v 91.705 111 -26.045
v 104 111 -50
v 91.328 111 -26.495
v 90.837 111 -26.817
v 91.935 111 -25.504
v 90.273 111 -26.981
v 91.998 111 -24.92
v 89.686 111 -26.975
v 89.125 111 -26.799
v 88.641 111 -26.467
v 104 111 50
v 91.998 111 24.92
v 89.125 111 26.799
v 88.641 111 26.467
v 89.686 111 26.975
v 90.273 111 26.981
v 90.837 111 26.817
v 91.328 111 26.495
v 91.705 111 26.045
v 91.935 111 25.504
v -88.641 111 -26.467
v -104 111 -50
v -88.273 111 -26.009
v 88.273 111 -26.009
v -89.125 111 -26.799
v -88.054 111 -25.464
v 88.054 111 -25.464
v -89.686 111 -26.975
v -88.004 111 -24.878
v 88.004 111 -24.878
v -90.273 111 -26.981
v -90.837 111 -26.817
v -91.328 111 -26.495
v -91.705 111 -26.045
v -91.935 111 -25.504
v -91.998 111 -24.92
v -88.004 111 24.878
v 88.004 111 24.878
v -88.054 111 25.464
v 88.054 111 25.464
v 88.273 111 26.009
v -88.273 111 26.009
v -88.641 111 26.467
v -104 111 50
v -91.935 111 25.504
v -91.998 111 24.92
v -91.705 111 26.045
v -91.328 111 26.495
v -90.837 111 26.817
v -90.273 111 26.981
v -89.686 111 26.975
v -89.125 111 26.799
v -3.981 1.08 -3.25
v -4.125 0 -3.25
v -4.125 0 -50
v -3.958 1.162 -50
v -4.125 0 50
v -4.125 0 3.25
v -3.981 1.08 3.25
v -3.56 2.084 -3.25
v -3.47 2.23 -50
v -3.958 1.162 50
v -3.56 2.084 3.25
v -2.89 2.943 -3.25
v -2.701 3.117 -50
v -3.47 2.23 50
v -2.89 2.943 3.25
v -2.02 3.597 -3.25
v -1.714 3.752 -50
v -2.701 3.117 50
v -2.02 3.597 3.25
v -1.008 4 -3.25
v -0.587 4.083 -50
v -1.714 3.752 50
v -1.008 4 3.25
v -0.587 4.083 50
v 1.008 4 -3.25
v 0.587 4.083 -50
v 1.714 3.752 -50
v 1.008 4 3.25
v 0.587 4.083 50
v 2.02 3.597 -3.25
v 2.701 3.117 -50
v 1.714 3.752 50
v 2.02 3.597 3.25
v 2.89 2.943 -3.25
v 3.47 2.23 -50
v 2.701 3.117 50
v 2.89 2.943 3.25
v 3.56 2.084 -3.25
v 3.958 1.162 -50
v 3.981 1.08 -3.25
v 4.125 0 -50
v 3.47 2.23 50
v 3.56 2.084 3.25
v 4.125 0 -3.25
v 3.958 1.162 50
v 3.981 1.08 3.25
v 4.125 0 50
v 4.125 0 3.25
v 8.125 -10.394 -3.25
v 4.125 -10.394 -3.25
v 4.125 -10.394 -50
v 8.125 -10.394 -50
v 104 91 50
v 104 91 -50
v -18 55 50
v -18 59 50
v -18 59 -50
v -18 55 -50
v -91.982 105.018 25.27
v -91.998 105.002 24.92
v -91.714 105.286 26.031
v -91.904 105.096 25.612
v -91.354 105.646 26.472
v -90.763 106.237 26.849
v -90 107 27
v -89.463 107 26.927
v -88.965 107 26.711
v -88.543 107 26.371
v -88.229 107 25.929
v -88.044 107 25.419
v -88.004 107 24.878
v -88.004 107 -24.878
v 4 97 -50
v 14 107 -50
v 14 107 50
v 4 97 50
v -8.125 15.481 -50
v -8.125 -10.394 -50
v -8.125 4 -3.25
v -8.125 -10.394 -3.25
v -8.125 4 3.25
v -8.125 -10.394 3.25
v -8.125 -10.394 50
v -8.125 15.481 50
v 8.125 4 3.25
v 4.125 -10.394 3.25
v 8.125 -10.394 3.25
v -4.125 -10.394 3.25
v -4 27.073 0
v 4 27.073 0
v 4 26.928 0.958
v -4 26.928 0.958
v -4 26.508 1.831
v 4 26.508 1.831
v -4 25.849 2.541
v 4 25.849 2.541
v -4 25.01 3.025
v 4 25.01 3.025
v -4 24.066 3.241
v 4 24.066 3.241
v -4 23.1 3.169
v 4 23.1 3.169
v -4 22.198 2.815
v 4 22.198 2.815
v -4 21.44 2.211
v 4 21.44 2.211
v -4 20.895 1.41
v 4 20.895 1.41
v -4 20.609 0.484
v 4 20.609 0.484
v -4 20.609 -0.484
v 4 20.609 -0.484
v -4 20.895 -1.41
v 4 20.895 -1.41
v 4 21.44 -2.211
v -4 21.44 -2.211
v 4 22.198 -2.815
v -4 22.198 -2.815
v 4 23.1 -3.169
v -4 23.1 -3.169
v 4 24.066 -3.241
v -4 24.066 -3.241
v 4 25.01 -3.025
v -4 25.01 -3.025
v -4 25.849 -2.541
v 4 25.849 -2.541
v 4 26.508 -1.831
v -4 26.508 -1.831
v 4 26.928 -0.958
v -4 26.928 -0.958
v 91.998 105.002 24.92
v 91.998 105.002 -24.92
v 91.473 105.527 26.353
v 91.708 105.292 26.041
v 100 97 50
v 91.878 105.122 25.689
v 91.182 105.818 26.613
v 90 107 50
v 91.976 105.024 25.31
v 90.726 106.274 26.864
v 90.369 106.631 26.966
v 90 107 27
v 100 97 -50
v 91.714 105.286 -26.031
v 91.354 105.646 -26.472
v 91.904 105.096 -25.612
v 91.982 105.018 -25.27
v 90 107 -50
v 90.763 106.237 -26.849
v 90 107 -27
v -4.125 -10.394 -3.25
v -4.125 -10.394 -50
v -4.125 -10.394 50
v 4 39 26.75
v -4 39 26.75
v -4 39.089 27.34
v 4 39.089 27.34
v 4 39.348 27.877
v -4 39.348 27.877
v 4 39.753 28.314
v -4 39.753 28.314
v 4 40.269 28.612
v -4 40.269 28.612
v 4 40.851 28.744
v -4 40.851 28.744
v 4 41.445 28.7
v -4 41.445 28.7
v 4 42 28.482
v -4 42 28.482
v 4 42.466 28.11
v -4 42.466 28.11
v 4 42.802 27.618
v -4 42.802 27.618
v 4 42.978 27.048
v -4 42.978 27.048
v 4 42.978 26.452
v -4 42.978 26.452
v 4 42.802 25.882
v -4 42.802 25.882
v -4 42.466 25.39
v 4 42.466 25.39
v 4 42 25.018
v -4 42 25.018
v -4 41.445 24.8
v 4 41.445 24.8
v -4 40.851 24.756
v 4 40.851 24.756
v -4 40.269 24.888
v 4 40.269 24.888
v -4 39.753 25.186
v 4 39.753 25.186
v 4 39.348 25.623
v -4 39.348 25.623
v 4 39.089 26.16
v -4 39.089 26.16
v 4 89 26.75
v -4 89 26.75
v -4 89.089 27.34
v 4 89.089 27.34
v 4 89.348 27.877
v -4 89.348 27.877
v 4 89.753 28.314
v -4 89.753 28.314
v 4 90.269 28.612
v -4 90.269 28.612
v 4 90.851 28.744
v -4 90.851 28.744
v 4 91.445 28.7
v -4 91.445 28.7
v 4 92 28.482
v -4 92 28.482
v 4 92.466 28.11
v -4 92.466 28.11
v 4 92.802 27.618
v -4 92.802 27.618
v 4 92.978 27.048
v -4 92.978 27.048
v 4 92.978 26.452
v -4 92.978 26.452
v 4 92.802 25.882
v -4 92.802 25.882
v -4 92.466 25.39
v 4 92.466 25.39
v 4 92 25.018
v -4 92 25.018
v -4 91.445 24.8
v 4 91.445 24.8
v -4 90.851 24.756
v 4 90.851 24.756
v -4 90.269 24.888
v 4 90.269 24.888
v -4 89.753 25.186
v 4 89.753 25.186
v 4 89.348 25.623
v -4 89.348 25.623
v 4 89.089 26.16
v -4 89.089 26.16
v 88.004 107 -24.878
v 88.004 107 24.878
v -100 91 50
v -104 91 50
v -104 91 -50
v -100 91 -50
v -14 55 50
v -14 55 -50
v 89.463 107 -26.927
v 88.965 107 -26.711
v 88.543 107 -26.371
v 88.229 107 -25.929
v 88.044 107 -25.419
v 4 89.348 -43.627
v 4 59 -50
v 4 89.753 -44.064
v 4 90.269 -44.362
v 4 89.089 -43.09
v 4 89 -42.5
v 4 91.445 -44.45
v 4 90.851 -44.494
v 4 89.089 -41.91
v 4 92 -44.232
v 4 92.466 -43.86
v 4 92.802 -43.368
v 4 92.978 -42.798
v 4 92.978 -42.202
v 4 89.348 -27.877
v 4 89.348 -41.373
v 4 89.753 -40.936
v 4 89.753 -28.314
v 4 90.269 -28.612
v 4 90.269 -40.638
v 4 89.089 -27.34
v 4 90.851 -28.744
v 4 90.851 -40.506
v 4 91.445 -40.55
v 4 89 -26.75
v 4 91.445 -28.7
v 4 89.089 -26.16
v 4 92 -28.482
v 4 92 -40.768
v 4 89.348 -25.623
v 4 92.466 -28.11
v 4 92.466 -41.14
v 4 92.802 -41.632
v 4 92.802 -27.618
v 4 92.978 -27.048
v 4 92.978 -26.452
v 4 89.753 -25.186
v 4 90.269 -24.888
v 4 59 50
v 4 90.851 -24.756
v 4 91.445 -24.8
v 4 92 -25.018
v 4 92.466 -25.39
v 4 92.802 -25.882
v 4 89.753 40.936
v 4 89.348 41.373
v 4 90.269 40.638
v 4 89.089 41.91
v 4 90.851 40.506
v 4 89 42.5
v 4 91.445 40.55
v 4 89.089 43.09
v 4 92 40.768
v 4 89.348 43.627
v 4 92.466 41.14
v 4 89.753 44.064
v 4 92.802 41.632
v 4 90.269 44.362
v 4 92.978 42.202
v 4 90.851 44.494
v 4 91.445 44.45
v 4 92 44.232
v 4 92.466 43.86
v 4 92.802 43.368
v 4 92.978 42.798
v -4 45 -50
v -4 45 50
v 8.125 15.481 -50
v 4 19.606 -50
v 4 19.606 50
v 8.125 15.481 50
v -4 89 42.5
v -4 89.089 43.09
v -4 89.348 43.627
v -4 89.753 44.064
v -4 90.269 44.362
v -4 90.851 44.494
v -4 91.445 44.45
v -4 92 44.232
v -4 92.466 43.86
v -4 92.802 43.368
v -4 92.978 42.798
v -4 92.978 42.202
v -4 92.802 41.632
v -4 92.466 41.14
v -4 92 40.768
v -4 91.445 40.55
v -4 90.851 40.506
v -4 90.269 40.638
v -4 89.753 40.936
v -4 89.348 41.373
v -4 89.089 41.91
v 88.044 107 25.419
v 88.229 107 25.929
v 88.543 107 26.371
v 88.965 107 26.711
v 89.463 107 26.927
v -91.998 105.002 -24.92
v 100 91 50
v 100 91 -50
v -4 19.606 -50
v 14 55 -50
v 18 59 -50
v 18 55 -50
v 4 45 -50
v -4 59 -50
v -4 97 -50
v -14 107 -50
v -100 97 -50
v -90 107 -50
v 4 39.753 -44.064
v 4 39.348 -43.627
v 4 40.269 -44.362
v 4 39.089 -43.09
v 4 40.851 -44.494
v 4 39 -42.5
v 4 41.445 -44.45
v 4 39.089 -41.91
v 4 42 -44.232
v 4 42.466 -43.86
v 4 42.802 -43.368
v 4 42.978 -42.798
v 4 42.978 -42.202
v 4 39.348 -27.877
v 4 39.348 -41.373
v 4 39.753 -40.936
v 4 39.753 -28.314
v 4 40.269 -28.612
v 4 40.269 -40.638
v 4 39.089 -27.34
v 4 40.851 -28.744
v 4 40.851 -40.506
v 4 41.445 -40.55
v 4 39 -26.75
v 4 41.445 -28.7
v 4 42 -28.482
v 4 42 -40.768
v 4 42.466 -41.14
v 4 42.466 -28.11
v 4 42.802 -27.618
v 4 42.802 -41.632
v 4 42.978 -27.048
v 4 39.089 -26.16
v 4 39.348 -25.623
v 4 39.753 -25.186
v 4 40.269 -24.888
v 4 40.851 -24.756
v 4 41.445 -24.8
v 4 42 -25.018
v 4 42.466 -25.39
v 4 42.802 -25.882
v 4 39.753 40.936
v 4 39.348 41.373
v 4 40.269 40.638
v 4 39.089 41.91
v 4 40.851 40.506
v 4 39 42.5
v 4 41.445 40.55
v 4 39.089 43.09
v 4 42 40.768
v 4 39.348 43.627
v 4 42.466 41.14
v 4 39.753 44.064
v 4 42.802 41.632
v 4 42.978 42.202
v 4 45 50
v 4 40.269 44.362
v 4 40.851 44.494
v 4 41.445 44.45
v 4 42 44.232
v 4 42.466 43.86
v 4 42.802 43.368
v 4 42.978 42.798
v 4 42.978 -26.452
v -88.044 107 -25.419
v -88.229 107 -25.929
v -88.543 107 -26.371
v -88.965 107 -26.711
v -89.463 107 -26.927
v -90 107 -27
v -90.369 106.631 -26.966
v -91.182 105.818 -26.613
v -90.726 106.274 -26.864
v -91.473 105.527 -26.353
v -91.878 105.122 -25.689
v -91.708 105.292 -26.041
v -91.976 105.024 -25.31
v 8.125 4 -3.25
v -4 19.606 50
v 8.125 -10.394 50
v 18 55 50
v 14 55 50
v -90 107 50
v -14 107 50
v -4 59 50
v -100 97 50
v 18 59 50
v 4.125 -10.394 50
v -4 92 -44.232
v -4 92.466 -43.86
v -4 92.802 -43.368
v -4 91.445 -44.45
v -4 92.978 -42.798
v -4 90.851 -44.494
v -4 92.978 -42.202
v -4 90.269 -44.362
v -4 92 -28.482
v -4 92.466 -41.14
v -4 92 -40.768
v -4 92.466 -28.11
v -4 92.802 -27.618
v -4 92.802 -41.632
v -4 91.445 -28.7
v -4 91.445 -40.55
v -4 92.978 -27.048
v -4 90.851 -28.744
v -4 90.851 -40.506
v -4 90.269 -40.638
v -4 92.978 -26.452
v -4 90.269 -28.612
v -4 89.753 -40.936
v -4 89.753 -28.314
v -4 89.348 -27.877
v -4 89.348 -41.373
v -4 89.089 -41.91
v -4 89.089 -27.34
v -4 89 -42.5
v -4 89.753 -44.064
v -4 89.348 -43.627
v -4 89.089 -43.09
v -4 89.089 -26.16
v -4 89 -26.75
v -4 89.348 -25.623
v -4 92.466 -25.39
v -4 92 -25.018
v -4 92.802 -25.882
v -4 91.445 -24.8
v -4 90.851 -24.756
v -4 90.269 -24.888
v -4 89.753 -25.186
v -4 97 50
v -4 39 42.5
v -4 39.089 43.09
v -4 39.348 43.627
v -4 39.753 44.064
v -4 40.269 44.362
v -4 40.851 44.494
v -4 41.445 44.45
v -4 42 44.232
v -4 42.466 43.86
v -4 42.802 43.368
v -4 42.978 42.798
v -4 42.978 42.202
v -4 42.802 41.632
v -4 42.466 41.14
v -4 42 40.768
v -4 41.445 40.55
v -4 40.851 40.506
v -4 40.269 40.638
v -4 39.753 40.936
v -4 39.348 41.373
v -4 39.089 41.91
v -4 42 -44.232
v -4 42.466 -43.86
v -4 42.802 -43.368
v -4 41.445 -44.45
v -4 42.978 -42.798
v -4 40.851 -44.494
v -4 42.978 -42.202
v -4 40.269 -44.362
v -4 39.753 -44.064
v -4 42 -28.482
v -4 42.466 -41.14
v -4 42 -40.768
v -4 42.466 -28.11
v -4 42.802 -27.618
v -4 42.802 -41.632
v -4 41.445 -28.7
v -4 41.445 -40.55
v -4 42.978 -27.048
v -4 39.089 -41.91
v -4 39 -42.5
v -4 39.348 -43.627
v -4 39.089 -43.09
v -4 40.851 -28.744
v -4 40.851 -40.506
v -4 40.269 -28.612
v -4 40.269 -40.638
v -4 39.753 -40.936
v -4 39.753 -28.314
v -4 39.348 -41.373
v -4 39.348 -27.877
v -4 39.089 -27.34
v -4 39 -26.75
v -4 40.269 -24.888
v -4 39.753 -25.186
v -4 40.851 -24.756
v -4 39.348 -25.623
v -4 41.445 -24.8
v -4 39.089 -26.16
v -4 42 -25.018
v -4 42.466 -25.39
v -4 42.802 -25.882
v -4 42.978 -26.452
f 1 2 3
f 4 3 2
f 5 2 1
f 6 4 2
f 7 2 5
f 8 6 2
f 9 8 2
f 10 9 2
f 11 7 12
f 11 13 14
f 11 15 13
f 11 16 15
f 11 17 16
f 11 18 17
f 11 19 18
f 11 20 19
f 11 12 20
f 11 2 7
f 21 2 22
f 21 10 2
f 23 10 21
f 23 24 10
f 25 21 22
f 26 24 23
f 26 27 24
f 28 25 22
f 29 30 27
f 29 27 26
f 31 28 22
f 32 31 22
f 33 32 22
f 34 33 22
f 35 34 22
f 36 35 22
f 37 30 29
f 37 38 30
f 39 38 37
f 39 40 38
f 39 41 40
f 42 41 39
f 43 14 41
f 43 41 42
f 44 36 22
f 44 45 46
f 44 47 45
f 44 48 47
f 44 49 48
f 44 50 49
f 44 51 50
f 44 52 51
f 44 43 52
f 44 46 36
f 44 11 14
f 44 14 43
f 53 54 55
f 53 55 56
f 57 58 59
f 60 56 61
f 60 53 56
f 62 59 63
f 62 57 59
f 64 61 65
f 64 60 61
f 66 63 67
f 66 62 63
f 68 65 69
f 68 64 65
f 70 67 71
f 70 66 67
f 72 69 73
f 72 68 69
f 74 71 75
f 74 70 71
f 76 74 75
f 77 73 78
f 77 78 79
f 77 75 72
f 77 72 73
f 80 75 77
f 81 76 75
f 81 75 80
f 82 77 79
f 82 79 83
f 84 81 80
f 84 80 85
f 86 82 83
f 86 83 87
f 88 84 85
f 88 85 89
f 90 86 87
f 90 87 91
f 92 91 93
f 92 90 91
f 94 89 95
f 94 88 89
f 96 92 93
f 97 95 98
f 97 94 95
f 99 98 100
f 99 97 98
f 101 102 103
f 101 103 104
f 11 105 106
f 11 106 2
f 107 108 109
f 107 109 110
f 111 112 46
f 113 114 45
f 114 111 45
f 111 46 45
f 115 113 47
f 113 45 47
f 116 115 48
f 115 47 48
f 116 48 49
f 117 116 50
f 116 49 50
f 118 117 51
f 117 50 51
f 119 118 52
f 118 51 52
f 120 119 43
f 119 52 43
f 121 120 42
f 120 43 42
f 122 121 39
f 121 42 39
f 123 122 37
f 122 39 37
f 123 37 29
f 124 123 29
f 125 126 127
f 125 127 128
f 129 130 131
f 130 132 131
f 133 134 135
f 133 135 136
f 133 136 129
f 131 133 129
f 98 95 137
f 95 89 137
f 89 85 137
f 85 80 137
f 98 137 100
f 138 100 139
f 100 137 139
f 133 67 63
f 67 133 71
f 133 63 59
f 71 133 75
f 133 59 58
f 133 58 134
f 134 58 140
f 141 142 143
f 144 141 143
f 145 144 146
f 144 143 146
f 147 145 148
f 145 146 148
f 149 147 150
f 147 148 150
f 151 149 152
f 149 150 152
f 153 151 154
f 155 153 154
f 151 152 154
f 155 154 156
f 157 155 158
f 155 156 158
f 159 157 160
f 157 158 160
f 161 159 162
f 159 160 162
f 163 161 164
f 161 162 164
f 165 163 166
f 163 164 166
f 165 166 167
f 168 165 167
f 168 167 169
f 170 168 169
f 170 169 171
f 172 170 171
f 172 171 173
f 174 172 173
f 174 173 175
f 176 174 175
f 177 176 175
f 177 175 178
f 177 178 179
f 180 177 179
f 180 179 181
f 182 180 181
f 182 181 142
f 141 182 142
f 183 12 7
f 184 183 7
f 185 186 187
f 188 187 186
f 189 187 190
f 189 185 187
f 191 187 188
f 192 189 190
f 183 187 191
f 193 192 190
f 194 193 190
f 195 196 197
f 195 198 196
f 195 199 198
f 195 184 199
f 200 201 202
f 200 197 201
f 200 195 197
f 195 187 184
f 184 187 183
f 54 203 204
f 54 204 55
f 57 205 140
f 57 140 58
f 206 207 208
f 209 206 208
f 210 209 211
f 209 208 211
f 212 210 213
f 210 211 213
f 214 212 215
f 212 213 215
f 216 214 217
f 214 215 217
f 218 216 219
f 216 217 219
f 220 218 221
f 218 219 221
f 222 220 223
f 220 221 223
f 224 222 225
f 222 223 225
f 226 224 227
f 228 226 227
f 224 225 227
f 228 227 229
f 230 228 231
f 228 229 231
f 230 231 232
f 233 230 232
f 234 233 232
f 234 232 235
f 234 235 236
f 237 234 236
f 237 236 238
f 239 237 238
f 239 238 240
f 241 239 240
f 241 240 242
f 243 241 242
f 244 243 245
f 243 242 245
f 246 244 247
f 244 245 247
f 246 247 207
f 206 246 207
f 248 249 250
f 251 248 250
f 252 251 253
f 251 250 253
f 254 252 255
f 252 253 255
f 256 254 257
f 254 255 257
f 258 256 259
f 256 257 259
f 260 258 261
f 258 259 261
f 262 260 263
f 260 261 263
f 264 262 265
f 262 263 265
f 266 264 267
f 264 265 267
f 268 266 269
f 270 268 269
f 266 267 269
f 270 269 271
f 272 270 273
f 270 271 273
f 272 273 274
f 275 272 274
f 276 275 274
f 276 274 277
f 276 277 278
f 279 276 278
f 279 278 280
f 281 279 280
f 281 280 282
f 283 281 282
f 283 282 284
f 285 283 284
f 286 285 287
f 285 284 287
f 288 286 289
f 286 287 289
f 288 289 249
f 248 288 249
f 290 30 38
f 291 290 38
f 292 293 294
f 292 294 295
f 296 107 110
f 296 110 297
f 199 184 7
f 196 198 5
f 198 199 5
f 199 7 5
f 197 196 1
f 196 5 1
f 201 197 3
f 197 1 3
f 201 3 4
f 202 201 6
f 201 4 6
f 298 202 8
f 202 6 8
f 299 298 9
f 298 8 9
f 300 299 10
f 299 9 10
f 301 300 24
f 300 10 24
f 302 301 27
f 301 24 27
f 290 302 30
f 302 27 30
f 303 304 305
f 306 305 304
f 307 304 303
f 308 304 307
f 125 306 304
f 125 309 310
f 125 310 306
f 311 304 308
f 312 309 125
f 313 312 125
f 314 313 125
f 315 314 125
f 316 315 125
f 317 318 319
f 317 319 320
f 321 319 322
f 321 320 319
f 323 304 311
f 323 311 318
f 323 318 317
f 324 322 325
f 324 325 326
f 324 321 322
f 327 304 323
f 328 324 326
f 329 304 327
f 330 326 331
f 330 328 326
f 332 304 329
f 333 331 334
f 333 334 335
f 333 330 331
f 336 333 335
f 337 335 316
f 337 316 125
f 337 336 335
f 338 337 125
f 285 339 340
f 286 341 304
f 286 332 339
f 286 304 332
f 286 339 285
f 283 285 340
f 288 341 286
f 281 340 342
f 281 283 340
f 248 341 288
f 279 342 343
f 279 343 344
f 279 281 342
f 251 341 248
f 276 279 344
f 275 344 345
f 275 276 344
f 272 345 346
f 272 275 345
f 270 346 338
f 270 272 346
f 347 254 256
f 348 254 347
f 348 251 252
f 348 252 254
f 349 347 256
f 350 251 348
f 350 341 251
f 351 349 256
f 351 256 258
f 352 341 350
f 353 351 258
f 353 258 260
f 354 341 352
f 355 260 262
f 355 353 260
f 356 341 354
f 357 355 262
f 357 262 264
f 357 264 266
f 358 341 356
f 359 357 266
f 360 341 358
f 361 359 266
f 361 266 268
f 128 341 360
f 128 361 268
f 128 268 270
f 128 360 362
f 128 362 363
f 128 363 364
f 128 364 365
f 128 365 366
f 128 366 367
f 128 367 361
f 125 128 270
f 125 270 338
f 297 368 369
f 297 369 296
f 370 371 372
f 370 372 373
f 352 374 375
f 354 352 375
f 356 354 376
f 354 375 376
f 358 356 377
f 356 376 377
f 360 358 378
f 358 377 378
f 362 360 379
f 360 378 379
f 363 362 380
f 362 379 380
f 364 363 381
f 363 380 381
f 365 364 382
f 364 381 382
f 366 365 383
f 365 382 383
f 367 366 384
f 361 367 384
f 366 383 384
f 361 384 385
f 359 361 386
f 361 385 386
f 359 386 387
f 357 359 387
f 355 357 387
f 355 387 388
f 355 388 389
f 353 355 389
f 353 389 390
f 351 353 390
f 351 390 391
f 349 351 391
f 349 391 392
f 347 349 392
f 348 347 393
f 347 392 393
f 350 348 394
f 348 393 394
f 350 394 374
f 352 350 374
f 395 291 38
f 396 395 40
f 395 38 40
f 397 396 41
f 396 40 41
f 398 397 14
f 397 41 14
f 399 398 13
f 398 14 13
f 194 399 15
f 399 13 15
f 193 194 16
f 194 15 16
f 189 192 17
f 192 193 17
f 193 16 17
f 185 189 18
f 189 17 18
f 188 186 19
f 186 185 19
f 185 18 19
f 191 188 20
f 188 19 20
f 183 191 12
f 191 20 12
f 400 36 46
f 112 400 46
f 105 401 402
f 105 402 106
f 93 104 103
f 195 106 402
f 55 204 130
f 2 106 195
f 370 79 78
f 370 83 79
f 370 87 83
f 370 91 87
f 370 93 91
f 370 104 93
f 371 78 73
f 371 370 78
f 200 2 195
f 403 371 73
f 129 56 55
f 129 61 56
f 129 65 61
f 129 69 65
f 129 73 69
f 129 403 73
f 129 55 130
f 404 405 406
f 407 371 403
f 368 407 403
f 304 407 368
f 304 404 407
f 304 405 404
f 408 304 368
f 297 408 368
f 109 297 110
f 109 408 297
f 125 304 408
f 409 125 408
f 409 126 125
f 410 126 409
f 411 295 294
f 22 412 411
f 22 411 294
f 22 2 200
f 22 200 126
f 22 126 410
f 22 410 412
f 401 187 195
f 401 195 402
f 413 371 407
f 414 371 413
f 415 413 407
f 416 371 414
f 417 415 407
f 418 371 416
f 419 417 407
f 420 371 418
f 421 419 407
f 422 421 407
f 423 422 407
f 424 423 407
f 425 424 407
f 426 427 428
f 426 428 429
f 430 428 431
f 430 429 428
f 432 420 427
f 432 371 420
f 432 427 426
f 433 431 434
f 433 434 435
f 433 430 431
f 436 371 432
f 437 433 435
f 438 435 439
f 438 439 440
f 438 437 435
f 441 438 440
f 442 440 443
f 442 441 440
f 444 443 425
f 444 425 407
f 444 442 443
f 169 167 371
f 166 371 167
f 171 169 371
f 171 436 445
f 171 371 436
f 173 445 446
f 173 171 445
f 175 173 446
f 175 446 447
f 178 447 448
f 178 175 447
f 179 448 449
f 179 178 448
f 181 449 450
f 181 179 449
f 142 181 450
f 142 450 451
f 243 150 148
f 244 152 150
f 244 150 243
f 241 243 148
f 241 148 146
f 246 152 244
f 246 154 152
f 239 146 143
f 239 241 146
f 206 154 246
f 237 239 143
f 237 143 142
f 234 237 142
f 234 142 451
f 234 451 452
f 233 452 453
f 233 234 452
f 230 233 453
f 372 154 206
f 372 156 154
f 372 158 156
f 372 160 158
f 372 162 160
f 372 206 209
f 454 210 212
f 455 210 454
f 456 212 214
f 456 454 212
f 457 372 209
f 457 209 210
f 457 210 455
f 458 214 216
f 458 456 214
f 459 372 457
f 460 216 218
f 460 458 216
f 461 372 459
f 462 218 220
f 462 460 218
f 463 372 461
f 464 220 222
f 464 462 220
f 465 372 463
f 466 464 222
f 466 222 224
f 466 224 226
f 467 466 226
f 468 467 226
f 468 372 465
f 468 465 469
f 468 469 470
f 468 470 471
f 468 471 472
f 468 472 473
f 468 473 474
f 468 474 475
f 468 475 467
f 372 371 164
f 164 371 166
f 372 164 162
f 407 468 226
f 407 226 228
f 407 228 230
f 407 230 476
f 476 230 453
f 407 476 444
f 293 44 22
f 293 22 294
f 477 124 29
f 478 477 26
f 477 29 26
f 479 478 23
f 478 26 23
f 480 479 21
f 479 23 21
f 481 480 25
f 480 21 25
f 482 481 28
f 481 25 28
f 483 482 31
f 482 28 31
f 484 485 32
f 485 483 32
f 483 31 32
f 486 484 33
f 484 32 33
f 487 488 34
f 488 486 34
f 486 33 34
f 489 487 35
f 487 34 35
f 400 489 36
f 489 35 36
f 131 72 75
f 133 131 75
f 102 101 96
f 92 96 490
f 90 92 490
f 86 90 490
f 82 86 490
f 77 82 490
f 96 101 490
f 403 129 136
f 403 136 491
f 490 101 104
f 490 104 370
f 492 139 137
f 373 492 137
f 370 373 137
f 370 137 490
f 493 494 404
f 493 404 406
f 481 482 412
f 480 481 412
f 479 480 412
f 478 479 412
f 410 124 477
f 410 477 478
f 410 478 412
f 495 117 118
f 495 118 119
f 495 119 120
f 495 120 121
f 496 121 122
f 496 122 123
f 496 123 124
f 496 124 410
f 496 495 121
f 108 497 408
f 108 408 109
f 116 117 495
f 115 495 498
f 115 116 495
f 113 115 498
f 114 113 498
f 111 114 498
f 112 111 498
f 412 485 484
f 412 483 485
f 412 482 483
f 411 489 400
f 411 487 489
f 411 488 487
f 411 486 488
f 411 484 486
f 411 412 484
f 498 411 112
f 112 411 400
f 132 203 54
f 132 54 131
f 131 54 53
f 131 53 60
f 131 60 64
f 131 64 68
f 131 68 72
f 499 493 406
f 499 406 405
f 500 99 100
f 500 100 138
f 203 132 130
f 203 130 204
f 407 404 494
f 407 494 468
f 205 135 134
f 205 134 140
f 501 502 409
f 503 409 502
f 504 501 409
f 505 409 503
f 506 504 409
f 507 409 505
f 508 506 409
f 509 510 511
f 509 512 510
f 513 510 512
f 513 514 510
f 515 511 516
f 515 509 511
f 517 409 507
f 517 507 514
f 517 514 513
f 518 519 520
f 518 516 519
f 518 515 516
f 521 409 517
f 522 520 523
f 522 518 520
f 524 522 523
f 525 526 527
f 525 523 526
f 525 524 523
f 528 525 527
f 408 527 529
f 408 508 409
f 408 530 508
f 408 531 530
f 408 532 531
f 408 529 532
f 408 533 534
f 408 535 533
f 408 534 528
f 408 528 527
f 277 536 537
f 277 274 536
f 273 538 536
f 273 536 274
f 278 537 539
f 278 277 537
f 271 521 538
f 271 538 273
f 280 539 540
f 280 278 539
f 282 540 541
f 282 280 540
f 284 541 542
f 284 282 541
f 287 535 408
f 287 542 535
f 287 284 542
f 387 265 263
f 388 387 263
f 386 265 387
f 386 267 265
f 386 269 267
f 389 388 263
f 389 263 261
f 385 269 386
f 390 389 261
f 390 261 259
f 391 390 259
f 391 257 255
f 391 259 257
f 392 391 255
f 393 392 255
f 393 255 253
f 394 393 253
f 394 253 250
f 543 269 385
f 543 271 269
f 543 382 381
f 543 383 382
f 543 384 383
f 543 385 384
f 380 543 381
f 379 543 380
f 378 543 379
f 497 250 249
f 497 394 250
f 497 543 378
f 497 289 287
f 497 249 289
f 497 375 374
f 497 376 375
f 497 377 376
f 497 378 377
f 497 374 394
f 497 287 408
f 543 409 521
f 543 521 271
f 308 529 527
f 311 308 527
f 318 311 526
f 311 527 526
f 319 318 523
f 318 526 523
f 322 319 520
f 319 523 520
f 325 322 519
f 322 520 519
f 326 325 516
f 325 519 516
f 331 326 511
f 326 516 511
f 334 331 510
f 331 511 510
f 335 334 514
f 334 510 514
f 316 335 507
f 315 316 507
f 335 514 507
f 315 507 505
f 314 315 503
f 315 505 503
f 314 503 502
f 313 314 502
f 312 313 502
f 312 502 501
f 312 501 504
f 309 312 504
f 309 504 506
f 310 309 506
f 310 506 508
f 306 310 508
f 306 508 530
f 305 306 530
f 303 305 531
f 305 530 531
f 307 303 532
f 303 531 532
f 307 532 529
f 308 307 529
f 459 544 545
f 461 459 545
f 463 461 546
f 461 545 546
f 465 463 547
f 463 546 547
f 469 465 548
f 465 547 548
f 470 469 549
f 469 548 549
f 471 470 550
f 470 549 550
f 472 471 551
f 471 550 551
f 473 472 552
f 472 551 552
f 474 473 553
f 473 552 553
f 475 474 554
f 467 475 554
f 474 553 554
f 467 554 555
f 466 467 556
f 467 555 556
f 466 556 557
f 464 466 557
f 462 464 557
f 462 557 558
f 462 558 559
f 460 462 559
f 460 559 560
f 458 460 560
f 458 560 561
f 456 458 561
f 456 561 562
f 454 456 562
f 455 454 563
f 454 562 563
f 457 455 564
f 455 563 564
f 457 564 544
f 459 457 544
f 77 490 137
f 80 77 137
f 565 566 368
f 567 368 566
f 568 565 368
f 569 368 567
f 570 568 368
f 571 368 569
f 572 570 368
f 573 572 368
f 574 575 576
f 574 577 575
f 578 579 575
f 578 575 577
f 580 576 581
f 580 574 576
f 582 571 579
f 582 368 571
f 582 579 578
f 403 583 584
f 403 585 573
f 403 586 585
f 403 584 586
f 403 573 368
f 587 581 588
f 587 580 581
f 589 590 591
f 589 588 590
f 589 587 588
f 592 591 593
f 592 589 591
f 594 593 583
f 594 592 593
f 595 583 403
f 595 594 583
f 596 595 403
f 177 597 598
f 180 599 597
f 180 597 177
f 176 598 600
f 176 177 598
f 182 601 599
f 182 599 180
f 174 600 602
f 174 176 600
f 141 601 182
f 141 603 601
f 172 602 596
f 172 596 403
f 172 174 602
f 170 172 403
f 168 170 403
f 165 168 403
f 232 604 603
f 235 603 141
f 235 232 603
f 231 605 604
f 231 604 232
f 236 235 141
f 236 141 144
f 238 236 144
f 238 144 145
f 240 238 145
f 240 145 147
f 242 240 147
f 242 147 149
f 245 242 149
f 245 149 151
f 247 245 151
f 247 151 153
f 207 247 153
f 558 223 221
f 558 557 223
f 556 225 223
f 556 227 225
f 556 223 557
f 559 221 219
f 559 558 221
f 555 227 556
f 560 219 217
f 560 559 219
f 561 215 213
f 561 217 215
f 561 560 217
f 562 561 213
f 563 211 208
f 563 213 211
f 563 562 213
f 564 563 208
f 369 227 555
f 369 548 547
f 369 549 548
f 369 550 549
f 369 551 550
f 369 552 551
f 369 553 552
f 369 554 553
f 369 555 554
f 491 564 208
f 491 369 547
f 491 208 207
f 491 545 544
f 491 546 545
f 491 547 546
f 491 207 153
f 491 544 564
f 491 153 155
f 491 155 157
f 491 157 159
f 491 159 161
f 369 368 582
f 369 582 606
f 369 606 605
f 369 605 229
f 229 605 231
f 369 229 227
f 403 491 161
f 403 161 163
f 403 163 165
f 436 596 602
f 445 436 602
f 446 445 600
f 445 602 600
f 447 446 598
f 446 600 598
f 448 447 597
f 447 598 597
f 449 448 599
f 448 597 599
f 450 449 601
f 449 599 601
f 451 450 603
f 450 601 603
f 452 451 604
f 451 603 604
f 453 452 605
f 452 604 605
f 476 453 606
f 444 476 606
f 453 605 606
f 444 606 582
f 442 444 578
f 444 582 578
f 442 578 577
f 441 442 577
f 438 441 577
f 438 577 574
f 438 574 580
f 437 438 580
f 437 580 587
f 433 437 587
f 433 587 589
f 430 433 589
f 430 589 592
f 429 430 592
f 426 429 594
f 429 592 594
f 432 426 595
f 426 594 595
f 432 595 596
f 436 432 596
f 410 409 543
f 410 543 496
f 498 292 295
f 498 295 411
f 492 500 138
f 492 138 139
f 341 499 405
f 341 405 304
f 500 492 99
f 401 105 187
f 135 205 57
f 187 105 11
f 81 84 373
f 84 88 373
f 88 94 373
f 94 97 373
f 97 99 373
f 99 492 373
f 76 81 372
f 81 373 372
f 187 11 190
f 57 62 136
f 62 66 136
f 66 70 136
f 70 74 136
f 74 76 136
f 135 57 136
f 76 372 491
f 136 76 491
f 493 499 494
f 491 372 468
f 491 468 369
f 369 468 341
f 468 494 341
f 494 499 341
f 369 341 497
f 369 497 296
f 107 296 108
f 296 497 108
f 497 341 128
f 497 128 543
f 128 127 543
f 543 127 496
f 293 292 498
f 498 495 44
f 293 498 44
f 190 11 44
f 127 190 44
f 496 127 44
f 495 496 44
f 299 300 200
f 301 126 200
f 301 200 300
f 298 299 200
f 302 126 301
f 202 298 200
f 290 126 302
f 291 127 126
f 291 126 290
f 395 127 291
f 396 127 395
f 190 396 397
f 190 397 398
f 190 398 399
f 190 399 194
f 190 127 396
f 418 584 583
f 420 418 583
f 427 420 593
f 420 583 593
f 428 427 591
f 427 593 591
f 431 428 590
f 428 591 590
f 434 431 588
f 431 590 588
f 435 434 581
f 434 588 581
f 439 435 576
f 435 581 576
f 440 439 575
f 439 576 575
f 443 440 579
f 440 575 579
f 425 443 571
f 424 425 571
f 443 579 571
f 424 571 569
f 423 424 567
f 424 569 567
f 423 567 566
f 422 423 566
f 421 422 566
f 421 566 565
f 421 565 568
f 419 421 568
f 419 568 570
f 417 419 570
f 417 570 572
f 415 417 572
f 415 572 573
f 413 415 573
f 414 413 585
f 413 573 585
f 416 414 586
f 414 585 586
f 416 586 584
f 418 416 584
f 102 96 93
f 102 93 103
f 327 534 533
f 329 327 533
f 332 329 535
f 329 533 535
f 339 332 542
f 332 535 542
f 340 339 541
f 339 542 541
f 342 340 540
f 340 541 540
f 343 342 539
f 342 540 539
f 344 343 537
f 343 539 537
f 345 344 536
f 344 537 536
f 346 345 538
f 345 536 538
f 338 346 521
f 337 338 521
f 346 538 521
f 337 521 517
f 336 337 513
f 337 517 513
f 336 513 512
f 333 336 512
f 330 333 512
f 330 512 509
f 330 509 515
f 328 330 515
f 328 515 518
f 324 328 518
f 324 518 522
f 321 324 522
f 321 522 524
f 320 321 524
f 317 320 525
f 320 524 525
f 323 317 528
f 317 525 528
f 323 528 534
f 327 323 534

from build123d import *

# Parameters (mm, degrees)
F2_DEPTH     = 50
F3_T1_DEPTH  = 100
F3_T6_DEPTH  = 100
F3_T11_DEPTH = 100
F5_R         = 2
F6_DEPTH     = 8
F8_DEPTH     = 6.001
F9_R         = 3.25
F10_DEPTH    = 25


# Not quite as in the source:
# - a fillet or chamfer that OpenCascade refuses, or shapes differently, is made with other operations: its cross-section is extruded or revolved along the edge and cut away or added


with BuildPart() as f2:
    # F1 (on Top) → F2 (new body, symmetric)
    with BuildSketch(Plane.XY):
        with BuildLine():
            Line((-8.125, 9.6056647934), (-8.125, -10.3943352066))
            Line((-8.125, -10.3943352066), (-4.125, -10.3943352066))
            Line((-4.125, -10.3943352066), (-4.125, 0))
            ThreePointArc((-4.125, 0), (0, 4.125), (4.125, 0))
            Line((4.125, 0), (4.125, -10.3943352066))
            Line((4.125, -10.3943352066), (8.125, -10.3943352066))
            Line((8.125, -10.3943352066), (8.125, 9.6056647934))
            Line((8.125, 9.6056647934), (4, 9.6056647934))
            Line((4, 9.6056647934), (4, 55))
            Line((4, 55), (18, 55))
            Line((18, 55), (18, 59))
            Line((18, 59), (4, 59))
            Line((4, 59), (4, 107))
            Line((4, 107), (100, 107))
            Line((100, 107), (100, 91))
            Line((100, 91), (104, 91))
            Line((104, 91), (104, 111))
            Line((104, 111), (0, 111))
            Line((0, 111), (-104, 111))
            Line((-104, 111), (-104, 91))
            Line((-104, 91), (-100, 91))
            Line((-100, 91), (-100, 107))
            Line((-100, 107), (-4, 107))
            Line((-4, 107), (-4, 59))
            Line((-4, 59), (-18, 59))
            Line((-18, 59), (-18, 55))
            Line((-18, 55), (-4, 55))
            Line((-4, 55), (-4, 9.6056647934))
            Line((-4, 9.6056647934), (-8.125, 9.6056647934))
        make_face()
    extrude(amount=F2_DEPTH, both=True)

    # F3: chamfer of 10 on 8 edges, made by hand

    # F3_s2 → F3_t1 (join)
    with BuildSketch(Plane.XY.offset(-50)):
        Polygon((14, 55), (4, 45), (4, 55), align=None)
        Polygon((-4, 45), (-14, 55), (-4, 55), align=None)
        Polygon((14, 107), (4, 97), (4, 107), align=None)
        Polygon((-4, 97), (-14, 107), (-4, 107), align=None)
        Polygon((100, 97), (90, 107), (100, 107), align=None)
        Polygon((-90, 107), (-100, 97), (-100, 107), align=None)
    extrude(amount=F3_T1_DEPTH)


with BuildPart() as f3_tool4:
    # F3_s5 → F3_t6 (new body)
    with BuildSketch(Plane.XY.offset(-50)):
        Polygon((4, 19.6056647934), (14, 9.6056647934), (4, 9.6056647934), align=None)
    extrude(amount=F3_T6_DEPTH)

    split(bisect_by=Plane.YZ.offset(8.125), keep=Keep.BOTTOM)


with BuildPart() as f2_1:
    add(f2.part)

    # F3_t3: union F3_tool4
    add(f3_tool4.part)


with BuildPart() as f3_tool9:
    # F3_s10 → F3_t11 (new body)
    with BuildSketch(Plane.XY.offset(50)):
        Polygon((-14, 9.6056647934), (-4, 19.6056647934), (-4, 9.6056647934), align=None)
    extrude(amount=-F3_T11_DEPTH)

    split(bisect_by=Plane.YZ.offset(-8.125), keep=Keep.TOP)


with BuildPart() as f2_2:
    add(f2_1.part)

    # F3_t8: union F3_tool9
    add(f3_tool9.part)

    # F5 (on face) → F6 (cut, through all)
    with BuildSketch(Plane(origin=(-4, 0, 0), x_dir=(0, -1, 0), z_dir=(-1, 0, 0))):
        with Locations((-91, -26.75)):
            Circle(F5_R)
        with Locations((-91, -42.5)):
            Circle(F5_R)
        with Locations((-41, -26.75)):
            Circle(F5_R)
        with Locations((-41, -42.5)):
            Circle(F5_R)
        with Locations((-41, 26.75)):
            Circle(F5_R)
        with Locations((-41, 42.5)):
            Circle(F5_R)
        with Locations((-91, 42.5)):
            Circle(F5_R)
        with Locations((-91, 26.75)):
            Circle(F5_R)
    extrude(amount=-F6_DEPTH, mode=Mode.SUBTRACT)

    # F7 (on face) → F8 (cut, through all)
    with BuildSketch(Plane(origin=(0, 111, 0), x_dir=(-1, 0, 0), z_dir=(0, 1, 0))):
        with BuildLine():
            Line((-91.9984134228, 0), (-91.9984134228, -24.9203520777))
            ThreePointArc((-91.9984134228, -24.9203520777), (-89.9790038693, -26.9998897876), (-88.003699271, -24.8784129963))
            Line((-88.003699271, -24.8784129963), (-88.003699271, 0))
            Line((-88.003699271, 0), (-88.003699271, 24.8784129963))
            ThreePointArc((-88.003699271, 24.8784129963), (-89.9790038693, 26.9998897876), (-91.9984134228, 24.9203520777))
            Line((-91.9984134228, 24.9203520777), (-91.9984134228, 0))
        make_face()
        with BuildLine():
            Line((88.003699271, 0), (88.003699271, -24.8784129963))
            ThreePointArc((88.003699271, -24.8784129963), (89.9790038693, -26.9998897876), (91.9984134228, -24.9203520777))
            Line((91.9984134228, -24.9203520777), (91.9984134228, 0))
            Line((91.9984134228, 0), (91.9984134228, 24.9203520777))
            ThreePointArc((91.9984134228, 24.9203520777), (89.9790038693, 26.9998897876), (88.003699271, 24.8784129963))
            Line((88.003699271, 24.8784129963), (88.003699271, 0))
        make_face()
    extrude(amount=-F8_DEPTH, mode=Mode.SUBTRACT)

    # F9 (on face) → F10 (cut)
    with BuildSketch(Plane.YZ.offset(8.125)):
        Polygon((4, 3.25), (-10.3943352066, 3.25), (-10.3943352066, 0), (-10.3943352066, -3.25), (4, -3.25), (4, 0), align=None)
        with Locations((23.8227438553, 0)):
            Circle(F9_R)
    extrude(amount=-F10_DEPTH, mode=Mode.SUBTRACT)


solid = f2_2.part
